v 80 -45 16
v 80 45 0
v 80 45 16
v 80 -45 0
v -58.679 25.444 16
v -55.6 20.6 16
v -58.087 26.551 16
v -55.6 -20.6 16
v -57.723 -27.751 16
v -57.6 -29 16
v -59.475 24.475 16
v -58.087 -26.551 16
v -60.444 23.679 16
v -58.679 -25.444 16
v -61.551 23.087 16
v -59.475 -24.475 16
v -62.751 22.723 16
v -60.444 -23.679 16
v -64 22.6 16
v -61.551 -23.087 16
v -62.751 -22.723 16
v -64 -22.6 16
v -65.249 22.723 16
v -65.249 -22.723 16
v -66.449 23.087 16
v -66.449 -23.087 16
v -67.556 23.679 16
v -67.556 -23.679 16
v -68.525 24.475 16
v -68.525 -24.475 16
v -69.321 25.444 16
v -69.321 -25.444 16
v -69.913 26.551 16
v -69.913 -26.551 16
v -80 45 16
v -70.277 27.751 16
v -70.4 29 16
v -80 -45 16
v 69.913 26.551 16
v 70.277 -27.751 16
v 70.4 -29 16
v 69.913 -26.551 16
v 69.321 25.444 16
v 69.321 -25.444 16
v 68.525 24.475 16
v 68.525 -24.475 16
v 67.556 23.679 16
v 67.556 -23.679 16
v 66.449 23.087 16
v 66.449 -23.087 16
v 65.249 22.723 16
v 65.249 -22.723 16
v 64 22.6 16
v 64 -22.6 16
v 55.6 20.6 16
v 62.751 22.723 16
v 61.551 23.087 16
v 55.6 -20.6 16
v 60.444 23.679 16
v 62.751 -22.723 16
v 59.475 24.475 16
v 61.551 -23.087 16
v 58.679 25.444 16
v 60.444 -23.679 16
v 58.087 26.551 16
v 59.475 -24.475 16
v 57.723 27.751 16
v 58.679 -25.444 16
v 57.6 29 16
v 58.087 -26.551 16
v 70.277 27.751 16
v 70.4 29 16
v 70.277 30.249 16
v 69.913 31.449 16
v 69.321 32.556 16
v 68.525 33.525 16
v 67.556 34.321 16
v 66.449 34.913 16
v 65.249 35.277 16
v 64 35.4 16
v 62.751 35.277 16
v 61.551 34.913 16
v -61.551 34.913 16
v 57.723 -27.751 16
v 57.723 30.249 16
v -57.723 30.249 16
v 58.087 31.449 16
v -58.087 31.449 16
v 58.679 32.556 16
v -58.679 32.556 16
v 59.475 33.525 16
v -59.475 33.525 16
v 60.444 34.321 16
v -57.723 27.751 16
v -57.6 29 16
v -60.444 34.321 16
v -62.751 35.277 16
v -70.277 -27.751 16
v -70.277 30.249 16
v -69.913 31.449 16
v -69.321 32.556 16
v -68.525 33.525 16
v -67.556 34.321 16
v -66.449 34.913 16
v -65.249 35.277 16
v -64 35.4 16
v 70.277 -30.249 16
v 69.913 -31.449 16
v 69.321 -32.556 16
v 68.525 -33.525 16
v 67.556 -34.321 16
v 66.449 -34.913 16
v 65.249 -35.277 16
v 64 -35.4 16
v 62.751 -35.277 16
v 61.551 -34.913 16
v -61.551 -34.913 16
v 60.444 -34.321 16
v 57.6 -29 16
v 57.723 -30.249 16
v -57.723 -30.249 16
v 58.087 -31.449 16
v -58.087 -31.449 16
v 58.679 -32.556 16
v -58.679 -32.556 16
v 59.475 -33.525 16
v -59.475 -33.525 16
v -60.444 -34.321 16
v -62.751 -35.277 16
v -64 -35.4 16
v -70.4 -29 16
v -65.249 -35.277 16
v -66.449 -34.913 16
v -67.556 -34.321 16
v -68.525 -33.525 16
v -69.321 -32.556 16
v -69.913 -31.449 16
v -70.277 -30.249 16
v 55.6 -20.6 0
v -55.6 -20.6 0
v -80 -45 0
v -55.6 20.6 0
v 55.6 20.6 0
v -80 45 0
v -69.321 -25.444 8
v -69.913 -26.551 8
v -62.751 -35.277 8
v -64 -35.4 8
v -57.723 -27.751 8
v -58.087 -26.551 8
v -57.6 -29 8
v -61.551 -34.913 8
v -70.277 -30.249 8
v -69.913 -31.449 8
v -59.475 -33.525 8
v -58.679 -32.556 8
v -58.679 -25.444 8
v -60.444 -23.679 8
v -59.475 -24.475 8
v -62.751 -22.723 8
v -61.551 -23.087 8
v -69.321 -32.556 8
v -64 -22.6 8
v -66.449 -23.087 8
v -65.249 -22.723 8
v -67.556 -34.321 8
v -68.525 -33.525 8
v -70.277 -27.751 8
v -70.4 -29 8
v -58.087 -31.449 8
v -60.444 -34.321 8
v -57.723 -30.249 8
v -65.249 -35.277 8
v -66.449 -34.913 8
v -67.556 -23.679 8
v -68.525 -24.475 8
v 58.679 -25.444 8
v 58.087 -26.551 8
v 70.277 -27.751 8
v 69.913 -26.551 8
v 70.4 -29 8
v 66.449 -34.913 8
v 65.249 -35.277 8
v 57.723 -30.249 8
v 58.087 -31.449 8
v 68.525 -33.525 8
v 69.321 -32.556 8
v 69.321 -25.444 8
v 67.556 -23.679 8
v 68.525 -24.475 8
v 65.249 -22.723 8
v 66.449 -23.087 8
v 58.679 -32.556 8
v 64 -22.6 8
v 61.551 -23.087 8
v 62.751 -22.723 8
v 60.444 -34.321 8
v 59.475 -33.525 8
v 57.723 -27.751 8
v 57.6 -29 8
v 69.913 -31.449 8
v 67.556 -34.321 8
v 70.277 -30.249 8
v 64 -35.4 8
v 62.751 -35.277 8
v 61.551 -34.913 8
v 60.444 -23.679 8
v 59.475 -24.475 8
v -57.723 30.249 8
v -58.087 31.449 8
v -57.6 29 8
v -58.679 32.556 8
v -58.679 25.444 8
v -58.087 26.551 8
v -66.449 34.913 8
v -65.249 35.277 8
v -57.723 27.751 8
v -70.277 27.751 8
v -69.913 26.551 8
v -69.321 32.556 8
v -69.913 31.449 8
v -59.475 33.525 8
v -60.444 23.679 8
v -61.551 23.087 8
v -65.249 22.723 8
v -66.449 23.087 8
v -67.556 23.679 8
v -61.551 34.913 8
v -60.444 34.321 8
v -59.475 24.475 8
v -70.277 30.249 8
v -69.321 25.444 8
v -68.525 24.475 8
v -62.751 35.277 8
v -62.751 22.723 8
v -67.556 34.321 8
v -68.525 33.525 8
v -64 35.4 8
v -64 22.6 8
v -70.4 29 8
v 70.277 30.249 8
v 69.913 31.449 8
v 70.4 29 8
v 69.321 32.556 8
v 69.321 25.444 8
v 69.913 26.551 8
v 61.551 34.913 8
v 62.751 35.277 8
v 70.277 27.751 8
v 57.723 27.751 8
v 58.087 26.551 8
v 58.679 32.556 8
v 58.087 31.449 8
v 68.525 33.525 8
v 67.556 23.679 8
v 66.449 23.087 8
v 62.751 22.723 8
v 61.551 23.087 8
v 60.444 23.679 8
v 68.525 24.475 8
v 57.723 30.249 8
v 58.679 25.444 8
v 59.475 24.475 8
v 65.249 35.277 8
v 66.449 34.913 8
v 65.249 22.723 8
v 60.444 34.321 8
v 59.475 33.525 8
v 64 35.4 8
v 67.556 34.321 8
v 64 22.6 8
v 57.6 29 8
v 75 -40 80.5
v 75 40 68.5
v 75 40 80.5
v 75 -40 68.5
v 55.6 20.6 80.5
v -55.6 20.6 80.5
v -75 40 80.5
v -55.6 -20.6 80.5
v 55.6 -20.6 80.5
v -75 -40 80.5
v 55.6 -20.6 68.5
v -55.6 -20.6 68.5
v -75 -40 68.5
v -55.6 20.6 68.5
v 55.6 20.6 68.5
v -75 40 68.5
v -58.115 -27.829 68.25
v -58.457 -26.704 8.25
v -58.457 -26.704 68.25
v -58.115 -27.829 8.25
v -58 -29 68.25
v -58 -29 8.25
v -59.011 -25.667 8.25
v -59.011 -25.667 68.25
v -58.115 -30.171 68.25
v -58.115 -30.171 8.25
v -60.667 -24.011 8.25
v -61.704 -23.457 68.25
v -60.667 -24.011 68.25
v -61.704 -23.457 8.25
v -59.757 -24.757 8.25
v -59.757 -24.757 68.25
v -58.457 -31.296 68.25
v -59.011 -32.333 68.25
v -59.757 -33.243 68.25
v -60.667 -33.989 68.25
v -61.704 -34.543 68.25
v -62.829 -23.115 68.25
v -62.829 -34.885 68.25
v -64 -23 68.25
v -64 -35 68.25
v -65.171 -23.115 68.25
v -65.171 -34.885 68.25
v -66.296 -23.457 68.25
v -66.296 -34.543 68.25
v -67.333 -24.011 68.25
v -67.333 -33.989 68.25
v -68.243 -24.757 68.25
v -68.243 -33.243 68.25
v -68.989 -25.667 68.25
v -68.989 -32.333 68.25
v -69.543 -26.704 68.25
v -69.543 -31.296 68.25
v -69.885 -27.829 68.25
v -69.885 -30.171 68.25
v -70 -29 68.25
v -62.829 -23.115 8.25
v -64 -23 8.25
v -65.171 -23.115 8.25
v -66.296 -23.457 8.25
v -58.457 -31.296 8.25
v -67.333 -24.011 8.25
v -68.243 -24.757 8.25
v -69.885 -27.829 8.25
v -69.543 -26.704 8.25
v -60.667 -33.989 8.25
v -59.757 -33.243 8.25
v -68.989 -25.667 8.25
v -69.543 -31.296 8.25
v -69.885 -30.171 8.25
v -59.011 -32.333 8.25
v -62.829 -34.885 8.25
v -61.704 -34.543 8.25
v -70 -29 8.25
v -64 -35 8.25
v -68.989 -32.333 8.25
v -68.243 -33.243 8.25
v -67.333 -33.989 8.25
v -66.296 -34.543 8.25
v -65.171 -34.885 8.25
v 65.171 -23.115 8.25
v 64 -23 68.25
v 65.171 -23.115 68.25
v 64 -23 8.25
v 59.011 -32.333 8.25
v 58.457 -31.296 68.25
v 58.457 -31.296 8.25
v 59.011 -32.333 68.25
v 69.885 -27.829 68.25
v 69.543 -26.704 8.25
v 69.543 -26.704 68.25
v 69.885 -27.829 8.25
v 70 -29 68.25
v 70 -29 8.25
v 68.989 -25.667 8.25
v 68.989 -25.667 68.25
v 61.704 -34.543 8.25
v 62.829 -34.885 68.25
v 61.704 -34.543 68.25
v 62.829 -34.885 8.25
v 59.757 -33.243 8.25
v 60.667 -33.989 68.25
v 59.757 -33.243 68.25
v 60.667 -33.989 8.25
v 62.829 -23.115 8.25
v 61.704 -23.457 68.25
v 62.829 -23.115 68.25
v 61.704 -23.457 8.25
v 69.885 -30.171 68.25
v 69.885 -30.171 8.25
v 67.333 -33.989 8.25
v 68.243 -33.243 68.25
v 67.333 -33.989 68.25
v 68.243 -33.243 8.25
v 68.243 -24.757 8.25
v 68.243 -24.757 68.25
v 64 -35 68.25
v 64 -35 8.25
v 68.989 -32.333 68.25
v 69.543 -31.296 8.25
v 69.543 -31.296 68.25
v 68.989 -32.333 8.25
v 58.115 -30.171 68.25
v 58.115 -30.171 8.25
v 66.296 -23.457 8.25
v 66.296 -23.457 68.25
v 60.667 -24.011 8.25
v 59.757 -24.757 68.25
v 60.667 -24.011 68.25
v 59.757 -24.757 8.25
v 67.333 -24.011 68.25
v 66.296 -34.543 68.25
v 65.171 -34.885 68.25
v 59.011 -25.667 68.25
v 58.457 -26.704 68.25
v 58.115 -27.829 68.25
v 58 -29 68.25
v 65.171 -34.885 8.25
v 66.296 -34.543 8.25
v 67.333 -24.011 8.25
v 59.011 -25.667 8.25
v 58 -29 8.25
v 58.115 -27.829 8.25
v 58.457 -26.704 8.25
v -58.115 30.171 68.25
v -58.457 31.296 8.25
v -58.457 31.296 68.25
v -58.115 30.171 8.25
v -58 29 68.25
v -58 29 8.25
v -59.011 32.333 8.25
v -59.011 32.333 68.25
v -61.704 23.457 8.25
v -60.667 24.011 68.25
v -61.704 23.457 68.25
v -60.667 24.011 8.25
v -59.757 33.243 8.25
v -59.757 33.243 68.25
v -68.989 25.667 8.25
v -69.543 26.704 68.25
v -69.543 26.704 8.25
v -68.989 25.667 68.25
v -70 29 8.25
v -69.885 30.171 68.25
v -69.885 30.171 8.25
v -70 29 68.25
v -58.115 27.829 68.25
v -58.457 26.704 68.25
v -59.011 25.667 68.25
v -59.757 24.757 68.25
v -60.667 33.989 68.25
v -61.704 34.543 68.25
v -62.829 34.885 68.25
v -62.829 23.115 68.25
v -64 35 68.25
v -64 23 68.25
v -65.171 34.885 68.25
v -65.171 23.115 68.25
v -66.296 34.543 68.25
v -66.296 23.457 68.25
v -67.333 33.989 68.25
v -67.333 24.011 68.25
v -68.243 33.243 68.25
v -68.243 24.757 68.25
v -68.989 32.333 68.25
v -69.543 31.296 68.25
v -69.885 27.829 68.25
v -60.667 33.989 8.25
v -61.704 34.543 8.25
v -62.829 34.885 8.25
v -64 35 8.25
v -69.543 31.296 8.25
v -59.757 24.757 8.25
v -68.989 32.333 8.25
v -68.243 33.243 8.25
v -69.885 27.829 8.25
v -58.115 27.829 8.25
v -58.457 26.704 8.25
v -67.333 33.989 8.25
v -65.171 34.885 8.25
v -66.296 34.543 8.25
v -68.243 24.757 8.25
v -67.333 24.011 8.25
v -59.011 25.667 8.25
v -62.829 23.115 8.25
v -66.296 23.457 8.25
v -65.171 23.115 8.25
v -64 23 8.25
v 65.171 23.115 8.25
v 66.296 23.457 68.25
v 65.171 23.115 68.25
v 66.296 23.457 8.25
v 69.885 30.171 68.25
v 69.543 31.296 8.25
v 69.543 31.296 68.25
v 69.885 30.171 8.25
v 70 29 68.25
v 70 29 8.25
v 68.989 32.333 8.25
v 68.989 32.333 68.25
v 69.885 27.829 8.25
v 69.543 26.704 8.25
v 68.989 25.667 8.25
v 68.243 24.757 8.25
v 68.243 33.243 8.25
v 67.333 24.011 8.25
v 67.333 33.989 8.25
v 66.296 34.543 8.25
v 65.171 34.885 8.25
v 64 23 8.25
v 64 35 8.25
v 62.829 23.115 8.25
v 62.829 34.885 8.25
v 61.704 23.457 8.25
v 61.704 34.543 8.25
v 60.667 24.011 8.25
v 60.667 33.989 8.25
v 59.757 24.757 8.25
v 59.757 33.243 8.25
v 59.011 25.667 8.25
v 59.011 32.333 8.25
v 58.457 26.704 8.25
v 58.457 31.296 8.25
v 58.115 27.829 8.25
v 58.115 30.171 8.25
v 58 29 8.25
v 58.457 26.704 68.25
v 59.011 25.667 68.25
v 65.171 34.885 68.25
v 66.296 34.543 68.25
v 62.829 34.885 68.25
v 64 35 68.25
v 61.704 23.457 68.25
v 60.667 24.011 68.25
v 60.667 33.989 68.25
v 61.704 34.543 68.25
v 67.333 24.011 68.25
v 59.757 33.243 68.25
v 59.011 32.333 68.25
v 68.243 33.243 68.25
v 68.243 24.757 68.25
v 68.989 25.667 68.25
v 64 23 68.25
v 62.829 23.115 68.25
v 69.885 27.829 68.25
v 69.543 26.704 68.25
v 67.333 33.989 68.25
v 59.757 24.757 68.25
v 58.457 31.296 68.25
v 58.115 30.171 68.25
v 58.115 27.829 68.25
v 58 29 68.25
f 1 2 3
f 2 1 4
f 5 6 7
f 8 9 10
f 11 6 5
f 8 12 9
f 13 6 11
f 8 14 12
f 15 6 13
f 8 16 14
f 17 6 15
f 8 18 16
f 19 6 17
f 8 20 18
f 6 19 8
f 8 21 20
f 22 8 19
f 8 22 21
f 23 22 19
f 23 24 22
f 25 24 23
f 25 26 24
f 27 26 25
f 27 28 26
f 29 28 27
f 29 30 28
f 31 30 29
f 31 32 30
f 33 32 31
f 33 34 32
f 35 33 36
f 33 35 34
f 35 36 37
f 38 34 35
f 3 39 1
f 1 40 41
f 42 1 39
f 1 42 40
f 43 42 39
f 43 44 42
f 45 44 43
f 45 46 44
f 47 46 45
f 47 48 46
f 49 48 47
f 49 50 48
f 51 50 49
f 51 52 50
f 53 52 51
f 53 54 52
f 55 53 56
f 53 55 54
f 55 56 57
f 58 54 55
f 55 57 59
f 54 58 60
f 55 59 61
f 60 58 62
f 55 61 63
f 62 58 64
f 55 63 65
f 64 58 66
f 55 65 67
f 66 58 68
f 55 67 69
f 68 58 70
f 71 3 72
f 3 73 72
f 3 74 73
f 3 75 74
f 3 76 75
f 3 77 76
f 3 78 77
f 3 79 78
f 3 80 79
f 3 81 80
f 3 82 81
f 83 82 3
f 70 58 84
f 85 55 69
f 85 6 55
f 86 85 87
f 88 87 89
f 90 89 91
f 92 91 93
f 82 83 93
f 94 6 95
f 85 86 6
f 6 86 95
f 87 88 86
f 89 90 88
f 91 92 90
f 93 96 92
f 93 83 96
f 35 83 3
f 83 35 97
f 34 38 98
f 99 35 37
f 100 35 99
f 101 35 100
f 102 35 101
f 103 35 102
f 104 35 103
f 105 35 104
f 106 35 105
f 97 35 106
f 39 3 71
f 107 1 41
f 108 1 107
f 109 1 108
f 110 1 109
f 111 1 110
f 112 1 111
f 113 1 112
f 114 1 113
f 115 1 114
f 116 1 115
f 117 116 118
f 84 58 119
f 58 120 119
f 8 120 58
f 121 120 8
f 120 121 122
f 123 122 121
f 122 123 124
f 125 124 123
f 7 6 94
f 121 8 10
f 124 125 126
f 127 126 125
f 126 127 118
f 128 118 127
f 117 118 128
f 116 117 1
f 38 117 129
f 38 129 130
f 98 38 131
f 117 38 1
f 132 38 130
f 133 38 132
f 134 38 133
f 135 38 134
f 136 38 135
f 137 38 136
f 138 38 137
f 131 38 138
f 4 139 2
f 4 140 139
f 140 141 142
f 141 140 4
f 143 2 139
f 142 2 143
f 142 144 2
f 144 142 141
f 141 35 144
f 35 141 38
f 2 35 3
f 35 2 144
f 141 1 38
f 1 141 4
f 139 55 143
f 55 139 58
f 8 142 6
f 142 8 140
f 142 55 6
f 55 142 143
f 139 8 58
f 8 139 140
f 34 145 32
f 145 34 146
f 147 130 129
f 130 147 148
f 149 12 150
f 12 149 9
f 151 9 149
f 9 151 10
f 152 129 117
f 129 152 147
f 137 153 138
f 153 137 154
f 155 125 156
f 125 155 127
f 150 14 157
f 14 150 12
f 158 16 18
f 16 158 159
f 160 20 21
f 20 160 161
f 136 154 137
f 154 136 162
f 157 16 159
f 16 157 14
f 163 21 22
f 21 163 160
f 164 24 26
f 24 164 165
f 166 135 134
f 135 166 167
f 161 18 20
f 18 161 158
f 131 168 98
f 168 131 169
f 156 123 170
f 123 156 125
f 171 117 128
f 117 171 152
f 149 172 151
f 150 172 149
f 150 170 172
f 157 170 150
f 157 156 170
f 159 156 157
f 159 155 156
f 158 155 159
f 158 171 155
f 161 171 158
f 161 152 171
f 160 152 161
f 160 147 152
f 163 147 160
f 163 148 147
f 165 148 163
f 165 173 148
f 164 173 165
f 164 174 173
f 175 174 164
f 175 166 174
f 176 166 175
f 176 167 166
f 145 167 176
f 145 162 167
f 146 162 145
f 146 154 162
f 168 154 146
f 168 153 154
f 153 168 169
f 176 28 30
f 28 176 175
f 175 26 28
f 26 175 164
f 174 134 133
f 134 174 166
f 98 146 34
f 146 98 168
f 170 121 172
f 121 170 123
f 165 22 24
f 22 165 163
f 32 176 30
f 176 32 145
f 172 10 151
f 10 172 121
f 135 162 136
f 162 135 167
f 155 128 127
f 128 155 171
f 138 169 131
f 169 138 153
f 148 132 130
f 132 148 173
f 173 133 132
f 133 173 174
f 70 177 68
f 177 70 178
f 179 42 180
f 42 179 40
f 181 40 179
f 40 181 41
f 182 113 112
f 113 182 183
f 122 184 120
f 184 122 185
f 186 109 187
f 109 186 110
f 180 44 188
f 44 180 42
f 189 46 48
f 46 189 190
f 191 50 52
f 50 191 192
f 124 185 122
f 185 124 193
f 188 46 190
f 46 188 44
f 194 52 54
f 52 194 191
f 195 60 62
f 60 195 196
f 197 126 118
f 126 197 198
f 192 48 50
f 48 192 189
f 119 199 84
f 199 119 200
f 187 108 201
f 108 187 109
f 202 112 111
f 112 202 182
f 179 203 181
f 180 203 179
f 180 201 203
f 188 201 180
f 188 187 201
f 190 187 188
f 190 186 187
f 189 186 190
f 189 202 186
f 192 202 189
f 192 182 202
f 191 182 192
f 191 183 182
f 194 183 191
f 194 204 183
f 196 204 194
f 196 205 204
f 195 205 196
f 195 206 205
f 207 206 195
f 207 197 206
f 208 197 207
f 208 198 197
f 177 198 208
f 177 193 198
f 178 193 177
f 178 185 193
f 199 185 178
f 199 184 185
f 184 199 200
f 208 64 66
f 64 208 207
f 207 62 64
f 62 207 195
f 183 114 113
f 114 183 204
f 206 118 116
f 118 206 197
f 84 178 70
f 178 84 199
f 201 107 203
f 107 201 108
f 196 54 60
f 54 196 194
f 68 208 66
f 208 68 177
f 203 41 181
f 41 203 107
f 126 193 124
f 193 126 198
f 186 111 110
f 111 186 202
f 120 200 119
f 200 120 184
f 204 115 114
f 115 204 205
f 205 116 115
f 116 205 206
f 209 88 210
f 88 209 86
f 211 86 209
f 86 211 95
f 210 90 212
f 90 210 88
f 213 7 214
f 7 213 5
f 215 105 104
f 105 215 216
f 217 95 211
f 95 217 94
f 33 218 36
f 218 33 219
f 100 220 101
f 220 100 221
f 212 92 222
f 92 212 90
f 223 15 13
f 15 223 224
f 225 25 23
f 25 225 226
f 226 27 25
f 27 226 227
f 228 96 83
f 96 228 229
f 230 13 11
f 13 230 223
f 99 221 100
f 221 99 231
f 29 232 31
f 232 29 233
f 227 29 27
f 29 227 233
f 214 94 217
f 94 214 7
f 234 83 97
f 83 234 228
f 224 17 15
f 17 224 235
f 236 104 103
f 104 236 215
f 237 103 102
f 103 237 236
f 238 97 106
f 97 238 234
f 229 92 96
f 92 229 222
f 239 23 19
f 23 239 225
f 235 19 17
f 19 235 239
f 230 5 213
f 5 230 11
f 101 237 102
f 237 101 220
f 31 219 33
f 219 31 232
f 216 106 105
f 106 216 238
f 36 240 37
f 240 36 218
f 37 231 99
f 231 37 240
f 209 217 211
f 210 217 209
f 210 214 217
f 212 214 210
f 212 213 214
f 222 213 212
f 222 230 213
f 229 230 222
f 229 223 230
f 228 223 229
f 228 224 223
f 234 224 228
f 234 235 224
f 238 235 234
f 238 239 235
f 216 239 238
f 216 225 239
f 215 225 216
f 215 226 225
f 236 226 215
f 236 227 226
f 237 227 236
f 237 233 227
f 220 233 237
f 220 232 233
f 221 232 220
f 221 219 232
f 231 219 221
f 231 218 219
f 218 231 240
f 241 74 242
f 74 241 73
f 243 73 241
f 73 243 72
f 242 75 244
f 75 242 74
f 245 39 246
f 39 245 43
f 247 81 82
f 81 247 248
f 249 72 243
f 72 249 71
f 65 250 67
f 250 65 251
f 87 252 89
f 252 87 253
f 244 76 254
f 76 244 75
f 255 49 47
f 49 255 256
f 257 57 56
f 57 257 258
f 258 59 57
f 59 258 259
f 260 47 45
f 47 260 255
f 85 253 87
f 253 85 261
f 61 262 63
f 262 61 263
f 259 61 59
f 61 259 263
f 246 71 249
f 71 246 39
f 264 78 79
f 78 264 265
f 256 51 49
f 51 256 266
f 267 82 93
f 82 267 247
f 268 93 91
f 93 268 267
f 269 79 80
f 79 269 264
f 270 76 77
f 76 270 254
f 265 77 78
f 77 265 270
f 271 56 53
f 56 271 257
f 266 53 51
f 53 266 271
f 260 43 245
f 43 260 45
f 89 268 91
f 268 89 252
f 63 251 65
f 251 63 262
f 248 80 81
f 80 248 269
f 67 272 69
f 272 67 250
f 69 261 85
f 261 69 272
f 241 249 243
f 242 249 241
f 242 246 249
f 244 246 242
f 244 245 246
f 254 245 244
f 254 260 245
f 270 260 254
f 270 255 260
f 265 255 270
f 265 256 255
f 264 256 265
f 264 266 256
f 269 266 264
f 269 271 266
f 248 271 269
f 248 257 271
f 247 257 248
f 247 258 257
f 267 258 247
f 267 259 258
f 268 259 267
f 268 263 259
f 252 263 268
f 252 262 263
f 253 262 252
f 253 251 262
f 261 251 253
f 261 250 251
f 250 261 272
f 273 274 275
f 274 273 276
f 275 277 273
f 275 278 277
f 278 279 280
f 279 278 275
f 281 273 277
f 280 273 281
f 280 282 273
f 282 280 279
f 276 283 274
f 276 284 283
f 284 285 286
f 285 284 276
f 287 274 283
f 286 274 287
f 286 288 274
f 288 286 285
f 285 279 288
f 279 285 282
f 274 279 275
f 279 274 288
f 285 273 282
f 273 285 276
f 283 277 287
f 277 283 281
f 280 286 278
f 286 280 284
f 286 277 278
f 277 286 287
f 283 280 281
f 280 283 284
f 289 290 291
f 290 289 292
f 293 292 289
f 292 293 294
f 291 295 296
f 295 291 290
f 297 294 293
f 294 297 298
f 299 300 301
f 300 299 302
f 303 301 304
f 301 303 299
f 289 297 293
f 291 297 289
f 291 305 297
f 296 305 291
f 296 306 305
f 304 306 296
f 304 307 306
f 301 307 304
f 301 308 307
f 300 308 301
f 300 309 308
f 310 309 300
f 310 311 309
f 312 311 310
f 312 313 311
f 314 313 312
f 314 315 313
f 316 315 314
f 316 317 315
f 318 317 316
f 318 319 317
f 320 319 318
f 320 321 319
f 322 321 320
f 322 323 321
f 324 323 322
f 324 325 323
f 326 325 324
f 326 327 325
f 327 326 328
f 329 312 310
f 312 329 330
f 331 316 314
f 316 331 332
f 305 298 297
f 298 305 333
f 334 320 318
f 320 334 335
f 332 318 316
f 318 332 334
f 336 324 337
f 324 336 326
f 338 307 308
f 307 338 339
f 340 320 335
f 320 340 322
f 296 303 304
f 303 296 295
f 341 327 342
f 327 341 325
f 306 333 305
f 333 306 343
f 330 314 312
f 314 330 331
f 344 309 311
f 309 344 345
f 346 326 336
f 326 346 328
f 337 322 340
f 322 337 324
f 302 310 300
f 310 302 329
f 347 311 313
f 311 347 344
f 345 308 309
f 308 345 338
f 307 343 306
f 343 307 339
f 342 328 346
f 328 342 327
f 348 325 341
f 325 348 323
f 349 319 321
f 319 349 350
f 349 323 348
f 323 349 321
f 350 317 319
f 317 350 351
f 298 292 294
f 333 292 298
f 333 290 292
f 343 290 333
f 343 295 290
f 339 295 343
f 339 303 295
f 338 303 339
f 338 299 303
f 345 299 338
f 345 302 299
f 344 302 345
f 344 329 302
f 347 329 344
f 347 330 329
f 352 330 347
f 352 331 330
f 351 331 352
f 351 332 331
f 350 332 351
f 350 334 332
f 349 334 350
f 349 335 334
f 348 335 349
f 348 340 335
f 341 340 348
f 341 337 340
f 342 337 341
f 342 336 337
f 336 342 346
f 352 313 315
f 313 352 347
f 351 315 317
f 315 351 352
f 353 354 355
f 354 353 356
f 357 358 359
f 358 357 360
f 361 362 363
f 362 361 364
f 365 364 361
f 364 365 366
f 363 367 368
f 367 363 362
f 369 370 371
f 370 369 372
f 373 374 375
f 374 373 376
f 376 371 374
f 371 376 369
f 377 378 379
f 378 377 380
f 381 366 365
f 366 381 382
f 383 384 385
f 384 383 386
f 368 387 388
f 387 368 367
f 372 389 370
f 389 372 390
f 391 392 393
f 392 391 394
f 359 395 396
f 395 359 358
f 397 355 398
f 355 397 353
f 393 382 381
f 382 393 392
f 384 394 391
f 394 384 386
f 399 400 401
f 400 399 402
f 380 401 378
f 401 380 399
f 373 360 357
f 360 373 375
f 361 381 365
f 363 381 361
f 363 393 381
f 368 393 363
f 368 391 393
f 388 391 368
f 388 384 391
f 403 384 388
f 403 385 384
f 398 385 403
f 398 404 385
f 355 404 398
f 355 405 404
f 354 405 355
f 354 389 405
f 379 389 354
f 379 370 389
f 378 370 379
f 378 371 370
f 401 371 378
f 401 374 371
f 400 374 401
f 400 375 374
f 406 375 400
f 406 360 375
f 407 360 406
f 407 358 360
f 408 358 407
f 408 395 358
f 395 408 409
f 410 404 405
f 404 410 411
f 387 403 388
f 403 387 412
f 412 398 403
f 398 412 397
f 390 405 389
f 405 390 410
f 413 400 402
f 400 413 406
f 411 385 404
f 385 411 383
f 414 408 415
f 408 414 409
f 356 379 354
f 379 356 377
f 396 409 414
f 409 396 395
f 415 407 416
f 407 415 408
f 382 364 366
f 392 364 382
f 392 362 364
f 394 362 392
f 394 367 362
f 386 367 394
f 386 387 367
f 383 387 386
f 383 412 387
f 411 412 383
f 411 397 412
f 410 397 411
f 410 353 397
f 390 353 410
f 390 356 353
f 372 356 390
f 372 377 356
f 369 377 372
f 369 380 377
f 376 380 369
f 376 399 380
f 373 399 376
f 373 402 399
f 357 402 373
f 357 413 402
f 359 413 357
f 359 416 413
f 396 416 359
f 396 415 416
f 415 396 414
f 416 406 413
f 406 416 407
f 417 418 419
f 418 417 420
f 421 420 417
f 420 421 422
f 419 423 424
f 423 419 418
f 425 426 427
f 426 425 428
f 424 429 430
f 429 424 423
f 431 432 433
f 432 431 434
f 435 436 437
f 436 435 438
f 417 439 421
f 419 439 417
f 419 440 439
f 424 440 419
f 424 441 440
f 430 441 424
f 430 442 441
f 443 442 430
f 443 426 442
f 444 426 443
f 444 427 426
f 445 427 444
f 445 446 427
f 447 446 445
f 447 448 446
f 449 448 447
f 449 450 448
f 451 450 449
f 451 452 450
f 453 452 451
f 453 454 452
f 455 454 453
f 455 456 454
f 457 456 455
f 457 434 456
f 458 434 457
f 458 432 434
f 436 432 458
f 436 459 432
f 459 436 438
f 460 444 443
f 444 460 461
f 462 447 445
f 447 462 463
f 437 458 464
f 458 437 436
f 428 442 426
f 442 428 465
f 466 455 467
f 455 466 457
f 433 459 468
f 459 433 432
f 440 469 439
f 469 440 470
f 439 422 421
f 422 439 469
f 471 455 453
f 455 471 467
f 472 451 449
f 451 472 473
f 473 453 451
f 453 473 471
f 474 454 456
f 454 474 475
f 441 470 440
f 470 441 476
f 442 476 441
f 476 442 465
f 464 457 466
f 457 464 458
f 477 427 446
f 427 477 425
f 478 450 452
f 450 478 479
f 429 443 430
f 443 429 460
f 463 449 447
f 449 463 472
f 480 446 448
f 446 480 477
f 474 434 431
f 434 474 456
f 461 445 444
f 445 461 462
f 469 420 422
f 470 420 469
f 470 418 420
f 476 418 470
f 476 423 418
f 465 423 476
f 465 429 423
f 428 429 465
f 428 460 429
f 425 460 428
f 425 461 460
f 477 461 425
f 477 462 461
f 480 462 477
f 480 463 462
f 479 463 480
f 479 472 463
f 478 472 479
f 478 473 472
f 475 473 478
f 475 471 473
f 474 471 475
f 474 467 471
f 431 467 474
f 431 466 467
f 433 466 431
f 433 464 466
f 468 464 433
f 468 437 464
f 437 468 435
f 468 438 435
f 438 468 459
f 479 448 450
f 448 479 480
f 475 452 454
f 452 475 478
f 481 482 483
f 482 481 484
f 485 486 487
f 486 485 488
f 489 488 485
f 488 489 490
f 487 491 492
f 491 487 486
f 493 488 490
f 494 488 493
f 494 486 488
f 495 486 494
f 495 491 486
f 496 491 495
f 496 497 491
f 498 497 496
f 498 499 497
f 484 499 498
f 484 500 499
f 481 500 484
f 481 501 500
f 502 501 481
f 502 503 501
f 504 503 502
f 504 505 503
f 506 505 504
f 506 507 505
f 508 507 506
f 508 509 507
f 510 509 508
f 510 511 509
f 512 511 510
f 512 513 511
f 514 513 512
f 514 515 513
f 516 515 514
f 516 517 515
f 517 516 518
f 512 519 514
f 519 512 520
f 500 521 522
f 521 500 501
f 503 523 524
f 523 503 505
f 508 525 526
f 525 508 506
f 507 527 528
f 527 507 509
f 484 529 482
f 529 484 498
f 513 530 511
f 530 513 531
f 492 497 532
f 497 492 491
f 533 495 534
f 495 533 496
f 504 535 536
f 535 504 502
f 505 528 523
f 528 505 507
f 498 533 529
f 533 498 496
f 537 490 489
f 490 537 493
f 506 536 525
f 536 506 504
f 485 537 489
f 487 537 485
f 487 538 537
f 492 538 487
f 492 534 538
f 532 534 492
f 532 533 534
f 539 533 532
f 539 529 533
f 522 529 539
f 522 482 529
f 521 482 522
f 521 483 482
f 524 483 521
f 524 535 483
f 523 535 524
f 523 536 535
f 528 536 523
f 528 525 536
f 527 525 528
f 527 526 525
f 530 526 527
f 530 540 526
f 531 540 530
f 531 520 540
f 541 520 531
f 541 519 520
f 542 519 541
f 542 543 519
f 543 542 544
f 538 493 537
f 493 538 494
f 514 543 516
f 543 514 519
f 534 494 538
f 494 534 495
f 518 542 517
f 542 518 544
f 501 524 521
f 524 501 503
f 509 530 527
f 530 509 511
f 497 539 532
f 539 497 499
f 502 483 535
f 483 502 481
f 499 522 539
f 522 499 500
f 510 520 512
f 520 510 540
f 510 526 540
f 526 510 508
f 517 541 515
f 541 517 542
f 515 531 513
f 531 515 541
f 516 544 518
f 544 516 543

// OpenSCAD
$fn = 32;

// ------------------------------------------------------------------------
// Frame cube: base 160 x 90 mm, posts 60 mm tall
// Every part is its own module, assembly() places every instance.
// ------------------------------------------------------------------------

// --- part 1 ---
module base_frame() {
  difference() {
    translate([-80, -45, 0]) cube([160, 90, 16]);
    translate([-55.6, -20.6, -1]) cube([111.2, 41.2, 18]);
    translate([-64, -29, 8]) cylinder(h = 9, d = 12.8);
    translate([64, -29, 8]) cylinder(h = 9, d = 12.8);
    translate([-64, 29, 8]) cylinder(h = 9, d = 12.8);
    translate([64, 29, 8]) cylinder(h = 9, d = 12.8);
  }
}

// --- part 2 ---
module corner_post() {
  cylinder(h = 60, d = 12);
}

// --- part 3 ---
module top_frame() {
  difference() {
    translate([-75, -40, 0]) cube([150, 80, 12]);
    translate([-55.6, -20.6, -1]) cube([111.2, 41.2, 14]);
  }
}

// --- assembly ---
module assembly() {
  color([0.80, 0.24, 0.20]) translate([0, 0, 0]) rotate([0, 0, 0]) base_frame();
  color([0.20, 0.45, 0.75]) translate([-64, -29, 8.25]) rotate([0, 0, 0]) corner_post();
  color([0.25, 0.62, 0.32]) translate([64, -29, 8.25]) rotate([0, 0, 0]) corner_post();
  color([0.92, 0.70, 0.18]) translate([-64, 29, 8.25]) rotate([0, 0, 0]) corner_post();
  color([0.58, 0.35, 0.70]) translate([64, 29, 8.25]) rotate([0, 0, 0]) corner_post();
  color([0.16, 0.66, 0.66]) translate([0, 0, 68.5]) rotate([0, 0, 0]) top_frame();
}

assembly();
